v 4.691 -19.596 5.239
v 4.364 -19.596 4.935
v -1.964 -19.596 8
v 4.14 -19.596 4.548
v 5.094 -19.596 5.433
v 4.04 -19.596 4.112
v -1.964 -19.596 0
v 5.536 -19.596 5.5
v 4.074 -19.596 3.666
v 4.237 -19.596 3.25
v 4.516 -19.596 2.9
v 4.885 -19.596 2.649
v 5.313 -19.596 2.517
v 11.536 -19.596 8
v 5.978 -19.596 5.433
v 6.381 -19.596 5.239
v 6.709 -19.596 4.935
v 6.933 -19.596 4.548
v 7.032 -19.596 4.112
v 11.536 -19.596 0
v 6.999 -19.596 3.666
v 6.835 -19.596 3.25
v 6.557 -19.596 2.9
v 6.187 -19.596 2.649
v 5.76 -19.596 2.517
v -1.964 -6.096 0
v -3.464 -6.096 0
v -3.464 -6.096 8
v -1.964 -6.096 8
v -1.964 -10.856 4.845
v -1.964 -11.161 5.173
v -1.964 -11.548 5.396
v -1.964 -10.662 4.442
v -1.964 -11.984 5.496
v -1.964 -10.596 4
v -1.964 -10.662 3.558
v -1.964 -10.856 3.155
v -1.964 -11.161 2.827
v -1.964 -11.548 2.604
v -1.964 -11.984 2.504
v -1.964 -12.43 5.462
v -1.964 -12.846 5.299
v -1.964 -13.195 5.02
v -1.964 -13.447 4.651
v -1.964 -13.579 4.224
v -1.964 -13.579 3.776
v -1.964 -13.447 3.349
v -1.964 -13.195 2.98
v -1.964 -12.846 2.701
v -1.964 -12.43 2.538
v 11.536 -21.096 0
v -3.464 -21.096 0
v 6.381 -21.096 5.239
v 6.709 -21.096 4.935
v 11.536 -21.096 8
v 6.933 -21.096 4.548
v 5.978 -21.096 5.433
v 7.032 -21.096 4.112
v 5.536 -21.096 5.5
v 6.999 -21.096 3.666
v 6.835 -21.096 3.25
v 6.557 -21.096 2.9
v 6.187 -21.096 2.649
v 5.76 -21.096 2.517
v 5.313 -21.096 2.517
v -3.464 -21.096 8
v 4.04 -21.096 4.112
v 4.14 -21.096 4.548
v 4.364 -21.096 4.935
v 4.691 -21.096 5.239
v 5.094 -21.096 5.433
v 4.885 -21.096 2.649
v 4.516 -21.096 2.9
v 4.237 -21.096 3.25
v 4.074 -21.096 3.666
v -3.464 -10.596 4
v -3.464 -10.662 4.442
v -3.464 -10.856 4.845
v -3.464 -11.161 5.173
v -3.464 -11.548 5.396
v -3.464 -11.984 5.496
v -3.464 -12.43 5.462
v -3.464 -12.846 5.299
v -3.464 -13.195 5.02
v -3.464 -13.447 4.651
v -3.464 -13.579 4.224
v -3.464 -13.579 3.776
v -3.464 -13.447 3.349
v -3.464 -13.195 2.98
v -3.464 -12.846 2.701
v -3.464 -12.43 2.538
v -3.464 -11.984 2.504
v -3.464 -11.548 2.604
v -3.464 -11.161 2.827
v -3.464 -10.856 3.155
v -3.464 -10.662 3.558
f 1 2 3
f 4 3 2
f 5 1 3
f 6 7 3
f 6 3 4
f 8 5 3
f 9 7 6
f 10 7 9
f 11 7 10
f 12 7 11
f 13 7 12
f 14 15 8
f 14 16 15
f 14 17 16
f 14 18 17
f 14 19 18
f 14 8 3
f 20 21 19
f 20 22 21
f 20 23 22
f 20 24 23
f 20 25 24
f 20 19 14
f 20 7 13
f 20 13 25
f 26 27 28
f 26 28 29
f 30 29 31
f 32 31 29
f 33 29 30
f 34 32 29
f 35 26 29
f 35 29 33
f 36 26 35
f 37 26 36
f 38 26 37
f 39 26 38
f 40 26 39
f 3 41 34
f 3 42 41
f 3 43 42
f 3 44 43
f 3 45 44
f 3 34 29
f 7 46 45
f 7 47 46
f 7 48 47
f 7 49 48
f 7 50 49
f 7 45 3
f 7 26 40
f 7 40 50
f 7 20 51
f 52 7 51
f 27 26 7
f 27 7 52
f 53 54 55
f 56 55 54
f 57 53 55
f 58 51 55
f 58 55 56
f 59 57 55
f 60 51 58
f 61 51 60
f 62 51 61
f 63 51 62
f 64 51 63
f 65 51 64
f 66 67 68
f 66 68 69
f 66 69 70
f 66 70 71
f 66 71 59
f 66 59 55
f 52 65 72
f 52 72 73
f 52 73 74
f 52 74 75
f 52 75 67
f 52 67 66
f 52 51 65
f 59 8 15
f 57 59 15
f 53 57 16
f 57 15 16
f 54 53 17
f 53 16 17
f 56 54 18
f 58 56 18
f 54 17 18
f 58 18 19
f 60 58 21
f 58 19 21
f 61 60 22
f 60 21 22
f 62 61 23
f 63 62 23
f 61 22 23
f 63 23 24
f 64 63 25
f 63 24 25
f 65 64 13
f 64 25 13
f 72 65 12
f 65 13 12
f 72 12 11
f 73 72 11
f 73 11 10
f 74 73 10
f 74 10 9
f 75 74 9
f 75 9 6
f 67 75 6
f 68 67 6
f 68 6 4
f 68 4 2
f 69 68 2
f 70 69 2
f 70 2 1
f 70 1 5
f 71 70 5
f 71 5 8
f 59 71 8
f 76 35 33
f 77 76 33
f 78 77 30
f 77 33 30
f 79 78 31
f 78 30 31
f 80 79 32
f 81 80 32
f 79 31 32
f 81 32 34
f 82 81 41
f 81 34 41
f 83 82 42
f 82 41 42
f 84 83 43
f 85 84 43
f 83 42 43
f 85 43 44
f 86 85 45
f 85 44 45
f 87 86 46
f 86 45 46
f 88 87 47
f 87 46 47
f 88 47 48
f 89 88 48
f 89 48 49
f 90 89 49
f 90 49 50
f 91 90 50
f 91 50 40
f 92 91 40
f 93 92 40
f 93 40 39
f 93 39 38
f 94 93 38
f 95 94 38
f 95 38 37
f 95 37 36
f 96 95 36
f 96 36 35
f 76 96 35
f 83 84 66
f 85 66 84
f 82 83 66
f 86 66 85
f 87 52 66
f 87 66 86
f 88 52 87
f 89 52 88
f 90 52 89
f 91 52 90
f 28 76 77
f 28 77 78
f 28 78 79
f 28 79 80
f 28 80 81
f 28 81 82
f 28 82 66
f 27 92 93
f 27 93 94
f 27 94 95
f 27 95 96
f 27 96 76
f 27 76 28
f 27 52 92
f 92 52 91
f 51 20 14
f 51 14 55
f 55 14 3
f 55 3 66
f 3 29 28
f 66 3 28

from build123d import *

# Parameters (mm, degrees)
EXTRUSION1_DEPTH = 8
ESQUISSE2_R      = 1.5
EXTRUSION2_DEPTH = 80
ESQUISSE3_R      = 1.5
EXTRUSION3_DEPTH = 80


with BuildPart() as part:
    # Esquisse1 → Extrusion1 (new body)
    with BuildSketch(Plane.XY):
        Polygon((-3.463711982, -6.095820103), (-1.963711982, -6.095820103), (-1.963711982, -19.595820103), (11.536288018, -19.595820103), (11.536288018, -21.095820103), (-3.463711982, -21.095820103), align=None)
    extrude(amount=EXTRUSION1_DEPTH)

    # Esquisse2 → Extrusion2 (cut)
    with BuildSketch(Plane(origin=(-1.963711982, 0, 0), x_dir=(0, 0, -1), z_dir=(1, 0, 0))):
        with Locations(Location((-4, -12.095820103, 0), (0, 0, 90))):
            Circle(ESQUISSE2_R)
    extrude(amount=-EXTRUSION2_DEPTH, mode=Mode.SUBTRACT)

    # Esquisse3 → Extrusion3 (cut)
    with BuildSketch(Plane(origin=(0, -19.595820103, 0), x_dir=(-1, 0, 0), z_dir=(0, 1, 0))):
        with Locations(Location((-5.536288018, 4, 0), (0, 0, 90))):
            Circle(ESQUISSE3_R)
    extrude(amount=-EXTRUSION3_DEPTH, mode=Mode.SUBTRACT)


solid = part.part
